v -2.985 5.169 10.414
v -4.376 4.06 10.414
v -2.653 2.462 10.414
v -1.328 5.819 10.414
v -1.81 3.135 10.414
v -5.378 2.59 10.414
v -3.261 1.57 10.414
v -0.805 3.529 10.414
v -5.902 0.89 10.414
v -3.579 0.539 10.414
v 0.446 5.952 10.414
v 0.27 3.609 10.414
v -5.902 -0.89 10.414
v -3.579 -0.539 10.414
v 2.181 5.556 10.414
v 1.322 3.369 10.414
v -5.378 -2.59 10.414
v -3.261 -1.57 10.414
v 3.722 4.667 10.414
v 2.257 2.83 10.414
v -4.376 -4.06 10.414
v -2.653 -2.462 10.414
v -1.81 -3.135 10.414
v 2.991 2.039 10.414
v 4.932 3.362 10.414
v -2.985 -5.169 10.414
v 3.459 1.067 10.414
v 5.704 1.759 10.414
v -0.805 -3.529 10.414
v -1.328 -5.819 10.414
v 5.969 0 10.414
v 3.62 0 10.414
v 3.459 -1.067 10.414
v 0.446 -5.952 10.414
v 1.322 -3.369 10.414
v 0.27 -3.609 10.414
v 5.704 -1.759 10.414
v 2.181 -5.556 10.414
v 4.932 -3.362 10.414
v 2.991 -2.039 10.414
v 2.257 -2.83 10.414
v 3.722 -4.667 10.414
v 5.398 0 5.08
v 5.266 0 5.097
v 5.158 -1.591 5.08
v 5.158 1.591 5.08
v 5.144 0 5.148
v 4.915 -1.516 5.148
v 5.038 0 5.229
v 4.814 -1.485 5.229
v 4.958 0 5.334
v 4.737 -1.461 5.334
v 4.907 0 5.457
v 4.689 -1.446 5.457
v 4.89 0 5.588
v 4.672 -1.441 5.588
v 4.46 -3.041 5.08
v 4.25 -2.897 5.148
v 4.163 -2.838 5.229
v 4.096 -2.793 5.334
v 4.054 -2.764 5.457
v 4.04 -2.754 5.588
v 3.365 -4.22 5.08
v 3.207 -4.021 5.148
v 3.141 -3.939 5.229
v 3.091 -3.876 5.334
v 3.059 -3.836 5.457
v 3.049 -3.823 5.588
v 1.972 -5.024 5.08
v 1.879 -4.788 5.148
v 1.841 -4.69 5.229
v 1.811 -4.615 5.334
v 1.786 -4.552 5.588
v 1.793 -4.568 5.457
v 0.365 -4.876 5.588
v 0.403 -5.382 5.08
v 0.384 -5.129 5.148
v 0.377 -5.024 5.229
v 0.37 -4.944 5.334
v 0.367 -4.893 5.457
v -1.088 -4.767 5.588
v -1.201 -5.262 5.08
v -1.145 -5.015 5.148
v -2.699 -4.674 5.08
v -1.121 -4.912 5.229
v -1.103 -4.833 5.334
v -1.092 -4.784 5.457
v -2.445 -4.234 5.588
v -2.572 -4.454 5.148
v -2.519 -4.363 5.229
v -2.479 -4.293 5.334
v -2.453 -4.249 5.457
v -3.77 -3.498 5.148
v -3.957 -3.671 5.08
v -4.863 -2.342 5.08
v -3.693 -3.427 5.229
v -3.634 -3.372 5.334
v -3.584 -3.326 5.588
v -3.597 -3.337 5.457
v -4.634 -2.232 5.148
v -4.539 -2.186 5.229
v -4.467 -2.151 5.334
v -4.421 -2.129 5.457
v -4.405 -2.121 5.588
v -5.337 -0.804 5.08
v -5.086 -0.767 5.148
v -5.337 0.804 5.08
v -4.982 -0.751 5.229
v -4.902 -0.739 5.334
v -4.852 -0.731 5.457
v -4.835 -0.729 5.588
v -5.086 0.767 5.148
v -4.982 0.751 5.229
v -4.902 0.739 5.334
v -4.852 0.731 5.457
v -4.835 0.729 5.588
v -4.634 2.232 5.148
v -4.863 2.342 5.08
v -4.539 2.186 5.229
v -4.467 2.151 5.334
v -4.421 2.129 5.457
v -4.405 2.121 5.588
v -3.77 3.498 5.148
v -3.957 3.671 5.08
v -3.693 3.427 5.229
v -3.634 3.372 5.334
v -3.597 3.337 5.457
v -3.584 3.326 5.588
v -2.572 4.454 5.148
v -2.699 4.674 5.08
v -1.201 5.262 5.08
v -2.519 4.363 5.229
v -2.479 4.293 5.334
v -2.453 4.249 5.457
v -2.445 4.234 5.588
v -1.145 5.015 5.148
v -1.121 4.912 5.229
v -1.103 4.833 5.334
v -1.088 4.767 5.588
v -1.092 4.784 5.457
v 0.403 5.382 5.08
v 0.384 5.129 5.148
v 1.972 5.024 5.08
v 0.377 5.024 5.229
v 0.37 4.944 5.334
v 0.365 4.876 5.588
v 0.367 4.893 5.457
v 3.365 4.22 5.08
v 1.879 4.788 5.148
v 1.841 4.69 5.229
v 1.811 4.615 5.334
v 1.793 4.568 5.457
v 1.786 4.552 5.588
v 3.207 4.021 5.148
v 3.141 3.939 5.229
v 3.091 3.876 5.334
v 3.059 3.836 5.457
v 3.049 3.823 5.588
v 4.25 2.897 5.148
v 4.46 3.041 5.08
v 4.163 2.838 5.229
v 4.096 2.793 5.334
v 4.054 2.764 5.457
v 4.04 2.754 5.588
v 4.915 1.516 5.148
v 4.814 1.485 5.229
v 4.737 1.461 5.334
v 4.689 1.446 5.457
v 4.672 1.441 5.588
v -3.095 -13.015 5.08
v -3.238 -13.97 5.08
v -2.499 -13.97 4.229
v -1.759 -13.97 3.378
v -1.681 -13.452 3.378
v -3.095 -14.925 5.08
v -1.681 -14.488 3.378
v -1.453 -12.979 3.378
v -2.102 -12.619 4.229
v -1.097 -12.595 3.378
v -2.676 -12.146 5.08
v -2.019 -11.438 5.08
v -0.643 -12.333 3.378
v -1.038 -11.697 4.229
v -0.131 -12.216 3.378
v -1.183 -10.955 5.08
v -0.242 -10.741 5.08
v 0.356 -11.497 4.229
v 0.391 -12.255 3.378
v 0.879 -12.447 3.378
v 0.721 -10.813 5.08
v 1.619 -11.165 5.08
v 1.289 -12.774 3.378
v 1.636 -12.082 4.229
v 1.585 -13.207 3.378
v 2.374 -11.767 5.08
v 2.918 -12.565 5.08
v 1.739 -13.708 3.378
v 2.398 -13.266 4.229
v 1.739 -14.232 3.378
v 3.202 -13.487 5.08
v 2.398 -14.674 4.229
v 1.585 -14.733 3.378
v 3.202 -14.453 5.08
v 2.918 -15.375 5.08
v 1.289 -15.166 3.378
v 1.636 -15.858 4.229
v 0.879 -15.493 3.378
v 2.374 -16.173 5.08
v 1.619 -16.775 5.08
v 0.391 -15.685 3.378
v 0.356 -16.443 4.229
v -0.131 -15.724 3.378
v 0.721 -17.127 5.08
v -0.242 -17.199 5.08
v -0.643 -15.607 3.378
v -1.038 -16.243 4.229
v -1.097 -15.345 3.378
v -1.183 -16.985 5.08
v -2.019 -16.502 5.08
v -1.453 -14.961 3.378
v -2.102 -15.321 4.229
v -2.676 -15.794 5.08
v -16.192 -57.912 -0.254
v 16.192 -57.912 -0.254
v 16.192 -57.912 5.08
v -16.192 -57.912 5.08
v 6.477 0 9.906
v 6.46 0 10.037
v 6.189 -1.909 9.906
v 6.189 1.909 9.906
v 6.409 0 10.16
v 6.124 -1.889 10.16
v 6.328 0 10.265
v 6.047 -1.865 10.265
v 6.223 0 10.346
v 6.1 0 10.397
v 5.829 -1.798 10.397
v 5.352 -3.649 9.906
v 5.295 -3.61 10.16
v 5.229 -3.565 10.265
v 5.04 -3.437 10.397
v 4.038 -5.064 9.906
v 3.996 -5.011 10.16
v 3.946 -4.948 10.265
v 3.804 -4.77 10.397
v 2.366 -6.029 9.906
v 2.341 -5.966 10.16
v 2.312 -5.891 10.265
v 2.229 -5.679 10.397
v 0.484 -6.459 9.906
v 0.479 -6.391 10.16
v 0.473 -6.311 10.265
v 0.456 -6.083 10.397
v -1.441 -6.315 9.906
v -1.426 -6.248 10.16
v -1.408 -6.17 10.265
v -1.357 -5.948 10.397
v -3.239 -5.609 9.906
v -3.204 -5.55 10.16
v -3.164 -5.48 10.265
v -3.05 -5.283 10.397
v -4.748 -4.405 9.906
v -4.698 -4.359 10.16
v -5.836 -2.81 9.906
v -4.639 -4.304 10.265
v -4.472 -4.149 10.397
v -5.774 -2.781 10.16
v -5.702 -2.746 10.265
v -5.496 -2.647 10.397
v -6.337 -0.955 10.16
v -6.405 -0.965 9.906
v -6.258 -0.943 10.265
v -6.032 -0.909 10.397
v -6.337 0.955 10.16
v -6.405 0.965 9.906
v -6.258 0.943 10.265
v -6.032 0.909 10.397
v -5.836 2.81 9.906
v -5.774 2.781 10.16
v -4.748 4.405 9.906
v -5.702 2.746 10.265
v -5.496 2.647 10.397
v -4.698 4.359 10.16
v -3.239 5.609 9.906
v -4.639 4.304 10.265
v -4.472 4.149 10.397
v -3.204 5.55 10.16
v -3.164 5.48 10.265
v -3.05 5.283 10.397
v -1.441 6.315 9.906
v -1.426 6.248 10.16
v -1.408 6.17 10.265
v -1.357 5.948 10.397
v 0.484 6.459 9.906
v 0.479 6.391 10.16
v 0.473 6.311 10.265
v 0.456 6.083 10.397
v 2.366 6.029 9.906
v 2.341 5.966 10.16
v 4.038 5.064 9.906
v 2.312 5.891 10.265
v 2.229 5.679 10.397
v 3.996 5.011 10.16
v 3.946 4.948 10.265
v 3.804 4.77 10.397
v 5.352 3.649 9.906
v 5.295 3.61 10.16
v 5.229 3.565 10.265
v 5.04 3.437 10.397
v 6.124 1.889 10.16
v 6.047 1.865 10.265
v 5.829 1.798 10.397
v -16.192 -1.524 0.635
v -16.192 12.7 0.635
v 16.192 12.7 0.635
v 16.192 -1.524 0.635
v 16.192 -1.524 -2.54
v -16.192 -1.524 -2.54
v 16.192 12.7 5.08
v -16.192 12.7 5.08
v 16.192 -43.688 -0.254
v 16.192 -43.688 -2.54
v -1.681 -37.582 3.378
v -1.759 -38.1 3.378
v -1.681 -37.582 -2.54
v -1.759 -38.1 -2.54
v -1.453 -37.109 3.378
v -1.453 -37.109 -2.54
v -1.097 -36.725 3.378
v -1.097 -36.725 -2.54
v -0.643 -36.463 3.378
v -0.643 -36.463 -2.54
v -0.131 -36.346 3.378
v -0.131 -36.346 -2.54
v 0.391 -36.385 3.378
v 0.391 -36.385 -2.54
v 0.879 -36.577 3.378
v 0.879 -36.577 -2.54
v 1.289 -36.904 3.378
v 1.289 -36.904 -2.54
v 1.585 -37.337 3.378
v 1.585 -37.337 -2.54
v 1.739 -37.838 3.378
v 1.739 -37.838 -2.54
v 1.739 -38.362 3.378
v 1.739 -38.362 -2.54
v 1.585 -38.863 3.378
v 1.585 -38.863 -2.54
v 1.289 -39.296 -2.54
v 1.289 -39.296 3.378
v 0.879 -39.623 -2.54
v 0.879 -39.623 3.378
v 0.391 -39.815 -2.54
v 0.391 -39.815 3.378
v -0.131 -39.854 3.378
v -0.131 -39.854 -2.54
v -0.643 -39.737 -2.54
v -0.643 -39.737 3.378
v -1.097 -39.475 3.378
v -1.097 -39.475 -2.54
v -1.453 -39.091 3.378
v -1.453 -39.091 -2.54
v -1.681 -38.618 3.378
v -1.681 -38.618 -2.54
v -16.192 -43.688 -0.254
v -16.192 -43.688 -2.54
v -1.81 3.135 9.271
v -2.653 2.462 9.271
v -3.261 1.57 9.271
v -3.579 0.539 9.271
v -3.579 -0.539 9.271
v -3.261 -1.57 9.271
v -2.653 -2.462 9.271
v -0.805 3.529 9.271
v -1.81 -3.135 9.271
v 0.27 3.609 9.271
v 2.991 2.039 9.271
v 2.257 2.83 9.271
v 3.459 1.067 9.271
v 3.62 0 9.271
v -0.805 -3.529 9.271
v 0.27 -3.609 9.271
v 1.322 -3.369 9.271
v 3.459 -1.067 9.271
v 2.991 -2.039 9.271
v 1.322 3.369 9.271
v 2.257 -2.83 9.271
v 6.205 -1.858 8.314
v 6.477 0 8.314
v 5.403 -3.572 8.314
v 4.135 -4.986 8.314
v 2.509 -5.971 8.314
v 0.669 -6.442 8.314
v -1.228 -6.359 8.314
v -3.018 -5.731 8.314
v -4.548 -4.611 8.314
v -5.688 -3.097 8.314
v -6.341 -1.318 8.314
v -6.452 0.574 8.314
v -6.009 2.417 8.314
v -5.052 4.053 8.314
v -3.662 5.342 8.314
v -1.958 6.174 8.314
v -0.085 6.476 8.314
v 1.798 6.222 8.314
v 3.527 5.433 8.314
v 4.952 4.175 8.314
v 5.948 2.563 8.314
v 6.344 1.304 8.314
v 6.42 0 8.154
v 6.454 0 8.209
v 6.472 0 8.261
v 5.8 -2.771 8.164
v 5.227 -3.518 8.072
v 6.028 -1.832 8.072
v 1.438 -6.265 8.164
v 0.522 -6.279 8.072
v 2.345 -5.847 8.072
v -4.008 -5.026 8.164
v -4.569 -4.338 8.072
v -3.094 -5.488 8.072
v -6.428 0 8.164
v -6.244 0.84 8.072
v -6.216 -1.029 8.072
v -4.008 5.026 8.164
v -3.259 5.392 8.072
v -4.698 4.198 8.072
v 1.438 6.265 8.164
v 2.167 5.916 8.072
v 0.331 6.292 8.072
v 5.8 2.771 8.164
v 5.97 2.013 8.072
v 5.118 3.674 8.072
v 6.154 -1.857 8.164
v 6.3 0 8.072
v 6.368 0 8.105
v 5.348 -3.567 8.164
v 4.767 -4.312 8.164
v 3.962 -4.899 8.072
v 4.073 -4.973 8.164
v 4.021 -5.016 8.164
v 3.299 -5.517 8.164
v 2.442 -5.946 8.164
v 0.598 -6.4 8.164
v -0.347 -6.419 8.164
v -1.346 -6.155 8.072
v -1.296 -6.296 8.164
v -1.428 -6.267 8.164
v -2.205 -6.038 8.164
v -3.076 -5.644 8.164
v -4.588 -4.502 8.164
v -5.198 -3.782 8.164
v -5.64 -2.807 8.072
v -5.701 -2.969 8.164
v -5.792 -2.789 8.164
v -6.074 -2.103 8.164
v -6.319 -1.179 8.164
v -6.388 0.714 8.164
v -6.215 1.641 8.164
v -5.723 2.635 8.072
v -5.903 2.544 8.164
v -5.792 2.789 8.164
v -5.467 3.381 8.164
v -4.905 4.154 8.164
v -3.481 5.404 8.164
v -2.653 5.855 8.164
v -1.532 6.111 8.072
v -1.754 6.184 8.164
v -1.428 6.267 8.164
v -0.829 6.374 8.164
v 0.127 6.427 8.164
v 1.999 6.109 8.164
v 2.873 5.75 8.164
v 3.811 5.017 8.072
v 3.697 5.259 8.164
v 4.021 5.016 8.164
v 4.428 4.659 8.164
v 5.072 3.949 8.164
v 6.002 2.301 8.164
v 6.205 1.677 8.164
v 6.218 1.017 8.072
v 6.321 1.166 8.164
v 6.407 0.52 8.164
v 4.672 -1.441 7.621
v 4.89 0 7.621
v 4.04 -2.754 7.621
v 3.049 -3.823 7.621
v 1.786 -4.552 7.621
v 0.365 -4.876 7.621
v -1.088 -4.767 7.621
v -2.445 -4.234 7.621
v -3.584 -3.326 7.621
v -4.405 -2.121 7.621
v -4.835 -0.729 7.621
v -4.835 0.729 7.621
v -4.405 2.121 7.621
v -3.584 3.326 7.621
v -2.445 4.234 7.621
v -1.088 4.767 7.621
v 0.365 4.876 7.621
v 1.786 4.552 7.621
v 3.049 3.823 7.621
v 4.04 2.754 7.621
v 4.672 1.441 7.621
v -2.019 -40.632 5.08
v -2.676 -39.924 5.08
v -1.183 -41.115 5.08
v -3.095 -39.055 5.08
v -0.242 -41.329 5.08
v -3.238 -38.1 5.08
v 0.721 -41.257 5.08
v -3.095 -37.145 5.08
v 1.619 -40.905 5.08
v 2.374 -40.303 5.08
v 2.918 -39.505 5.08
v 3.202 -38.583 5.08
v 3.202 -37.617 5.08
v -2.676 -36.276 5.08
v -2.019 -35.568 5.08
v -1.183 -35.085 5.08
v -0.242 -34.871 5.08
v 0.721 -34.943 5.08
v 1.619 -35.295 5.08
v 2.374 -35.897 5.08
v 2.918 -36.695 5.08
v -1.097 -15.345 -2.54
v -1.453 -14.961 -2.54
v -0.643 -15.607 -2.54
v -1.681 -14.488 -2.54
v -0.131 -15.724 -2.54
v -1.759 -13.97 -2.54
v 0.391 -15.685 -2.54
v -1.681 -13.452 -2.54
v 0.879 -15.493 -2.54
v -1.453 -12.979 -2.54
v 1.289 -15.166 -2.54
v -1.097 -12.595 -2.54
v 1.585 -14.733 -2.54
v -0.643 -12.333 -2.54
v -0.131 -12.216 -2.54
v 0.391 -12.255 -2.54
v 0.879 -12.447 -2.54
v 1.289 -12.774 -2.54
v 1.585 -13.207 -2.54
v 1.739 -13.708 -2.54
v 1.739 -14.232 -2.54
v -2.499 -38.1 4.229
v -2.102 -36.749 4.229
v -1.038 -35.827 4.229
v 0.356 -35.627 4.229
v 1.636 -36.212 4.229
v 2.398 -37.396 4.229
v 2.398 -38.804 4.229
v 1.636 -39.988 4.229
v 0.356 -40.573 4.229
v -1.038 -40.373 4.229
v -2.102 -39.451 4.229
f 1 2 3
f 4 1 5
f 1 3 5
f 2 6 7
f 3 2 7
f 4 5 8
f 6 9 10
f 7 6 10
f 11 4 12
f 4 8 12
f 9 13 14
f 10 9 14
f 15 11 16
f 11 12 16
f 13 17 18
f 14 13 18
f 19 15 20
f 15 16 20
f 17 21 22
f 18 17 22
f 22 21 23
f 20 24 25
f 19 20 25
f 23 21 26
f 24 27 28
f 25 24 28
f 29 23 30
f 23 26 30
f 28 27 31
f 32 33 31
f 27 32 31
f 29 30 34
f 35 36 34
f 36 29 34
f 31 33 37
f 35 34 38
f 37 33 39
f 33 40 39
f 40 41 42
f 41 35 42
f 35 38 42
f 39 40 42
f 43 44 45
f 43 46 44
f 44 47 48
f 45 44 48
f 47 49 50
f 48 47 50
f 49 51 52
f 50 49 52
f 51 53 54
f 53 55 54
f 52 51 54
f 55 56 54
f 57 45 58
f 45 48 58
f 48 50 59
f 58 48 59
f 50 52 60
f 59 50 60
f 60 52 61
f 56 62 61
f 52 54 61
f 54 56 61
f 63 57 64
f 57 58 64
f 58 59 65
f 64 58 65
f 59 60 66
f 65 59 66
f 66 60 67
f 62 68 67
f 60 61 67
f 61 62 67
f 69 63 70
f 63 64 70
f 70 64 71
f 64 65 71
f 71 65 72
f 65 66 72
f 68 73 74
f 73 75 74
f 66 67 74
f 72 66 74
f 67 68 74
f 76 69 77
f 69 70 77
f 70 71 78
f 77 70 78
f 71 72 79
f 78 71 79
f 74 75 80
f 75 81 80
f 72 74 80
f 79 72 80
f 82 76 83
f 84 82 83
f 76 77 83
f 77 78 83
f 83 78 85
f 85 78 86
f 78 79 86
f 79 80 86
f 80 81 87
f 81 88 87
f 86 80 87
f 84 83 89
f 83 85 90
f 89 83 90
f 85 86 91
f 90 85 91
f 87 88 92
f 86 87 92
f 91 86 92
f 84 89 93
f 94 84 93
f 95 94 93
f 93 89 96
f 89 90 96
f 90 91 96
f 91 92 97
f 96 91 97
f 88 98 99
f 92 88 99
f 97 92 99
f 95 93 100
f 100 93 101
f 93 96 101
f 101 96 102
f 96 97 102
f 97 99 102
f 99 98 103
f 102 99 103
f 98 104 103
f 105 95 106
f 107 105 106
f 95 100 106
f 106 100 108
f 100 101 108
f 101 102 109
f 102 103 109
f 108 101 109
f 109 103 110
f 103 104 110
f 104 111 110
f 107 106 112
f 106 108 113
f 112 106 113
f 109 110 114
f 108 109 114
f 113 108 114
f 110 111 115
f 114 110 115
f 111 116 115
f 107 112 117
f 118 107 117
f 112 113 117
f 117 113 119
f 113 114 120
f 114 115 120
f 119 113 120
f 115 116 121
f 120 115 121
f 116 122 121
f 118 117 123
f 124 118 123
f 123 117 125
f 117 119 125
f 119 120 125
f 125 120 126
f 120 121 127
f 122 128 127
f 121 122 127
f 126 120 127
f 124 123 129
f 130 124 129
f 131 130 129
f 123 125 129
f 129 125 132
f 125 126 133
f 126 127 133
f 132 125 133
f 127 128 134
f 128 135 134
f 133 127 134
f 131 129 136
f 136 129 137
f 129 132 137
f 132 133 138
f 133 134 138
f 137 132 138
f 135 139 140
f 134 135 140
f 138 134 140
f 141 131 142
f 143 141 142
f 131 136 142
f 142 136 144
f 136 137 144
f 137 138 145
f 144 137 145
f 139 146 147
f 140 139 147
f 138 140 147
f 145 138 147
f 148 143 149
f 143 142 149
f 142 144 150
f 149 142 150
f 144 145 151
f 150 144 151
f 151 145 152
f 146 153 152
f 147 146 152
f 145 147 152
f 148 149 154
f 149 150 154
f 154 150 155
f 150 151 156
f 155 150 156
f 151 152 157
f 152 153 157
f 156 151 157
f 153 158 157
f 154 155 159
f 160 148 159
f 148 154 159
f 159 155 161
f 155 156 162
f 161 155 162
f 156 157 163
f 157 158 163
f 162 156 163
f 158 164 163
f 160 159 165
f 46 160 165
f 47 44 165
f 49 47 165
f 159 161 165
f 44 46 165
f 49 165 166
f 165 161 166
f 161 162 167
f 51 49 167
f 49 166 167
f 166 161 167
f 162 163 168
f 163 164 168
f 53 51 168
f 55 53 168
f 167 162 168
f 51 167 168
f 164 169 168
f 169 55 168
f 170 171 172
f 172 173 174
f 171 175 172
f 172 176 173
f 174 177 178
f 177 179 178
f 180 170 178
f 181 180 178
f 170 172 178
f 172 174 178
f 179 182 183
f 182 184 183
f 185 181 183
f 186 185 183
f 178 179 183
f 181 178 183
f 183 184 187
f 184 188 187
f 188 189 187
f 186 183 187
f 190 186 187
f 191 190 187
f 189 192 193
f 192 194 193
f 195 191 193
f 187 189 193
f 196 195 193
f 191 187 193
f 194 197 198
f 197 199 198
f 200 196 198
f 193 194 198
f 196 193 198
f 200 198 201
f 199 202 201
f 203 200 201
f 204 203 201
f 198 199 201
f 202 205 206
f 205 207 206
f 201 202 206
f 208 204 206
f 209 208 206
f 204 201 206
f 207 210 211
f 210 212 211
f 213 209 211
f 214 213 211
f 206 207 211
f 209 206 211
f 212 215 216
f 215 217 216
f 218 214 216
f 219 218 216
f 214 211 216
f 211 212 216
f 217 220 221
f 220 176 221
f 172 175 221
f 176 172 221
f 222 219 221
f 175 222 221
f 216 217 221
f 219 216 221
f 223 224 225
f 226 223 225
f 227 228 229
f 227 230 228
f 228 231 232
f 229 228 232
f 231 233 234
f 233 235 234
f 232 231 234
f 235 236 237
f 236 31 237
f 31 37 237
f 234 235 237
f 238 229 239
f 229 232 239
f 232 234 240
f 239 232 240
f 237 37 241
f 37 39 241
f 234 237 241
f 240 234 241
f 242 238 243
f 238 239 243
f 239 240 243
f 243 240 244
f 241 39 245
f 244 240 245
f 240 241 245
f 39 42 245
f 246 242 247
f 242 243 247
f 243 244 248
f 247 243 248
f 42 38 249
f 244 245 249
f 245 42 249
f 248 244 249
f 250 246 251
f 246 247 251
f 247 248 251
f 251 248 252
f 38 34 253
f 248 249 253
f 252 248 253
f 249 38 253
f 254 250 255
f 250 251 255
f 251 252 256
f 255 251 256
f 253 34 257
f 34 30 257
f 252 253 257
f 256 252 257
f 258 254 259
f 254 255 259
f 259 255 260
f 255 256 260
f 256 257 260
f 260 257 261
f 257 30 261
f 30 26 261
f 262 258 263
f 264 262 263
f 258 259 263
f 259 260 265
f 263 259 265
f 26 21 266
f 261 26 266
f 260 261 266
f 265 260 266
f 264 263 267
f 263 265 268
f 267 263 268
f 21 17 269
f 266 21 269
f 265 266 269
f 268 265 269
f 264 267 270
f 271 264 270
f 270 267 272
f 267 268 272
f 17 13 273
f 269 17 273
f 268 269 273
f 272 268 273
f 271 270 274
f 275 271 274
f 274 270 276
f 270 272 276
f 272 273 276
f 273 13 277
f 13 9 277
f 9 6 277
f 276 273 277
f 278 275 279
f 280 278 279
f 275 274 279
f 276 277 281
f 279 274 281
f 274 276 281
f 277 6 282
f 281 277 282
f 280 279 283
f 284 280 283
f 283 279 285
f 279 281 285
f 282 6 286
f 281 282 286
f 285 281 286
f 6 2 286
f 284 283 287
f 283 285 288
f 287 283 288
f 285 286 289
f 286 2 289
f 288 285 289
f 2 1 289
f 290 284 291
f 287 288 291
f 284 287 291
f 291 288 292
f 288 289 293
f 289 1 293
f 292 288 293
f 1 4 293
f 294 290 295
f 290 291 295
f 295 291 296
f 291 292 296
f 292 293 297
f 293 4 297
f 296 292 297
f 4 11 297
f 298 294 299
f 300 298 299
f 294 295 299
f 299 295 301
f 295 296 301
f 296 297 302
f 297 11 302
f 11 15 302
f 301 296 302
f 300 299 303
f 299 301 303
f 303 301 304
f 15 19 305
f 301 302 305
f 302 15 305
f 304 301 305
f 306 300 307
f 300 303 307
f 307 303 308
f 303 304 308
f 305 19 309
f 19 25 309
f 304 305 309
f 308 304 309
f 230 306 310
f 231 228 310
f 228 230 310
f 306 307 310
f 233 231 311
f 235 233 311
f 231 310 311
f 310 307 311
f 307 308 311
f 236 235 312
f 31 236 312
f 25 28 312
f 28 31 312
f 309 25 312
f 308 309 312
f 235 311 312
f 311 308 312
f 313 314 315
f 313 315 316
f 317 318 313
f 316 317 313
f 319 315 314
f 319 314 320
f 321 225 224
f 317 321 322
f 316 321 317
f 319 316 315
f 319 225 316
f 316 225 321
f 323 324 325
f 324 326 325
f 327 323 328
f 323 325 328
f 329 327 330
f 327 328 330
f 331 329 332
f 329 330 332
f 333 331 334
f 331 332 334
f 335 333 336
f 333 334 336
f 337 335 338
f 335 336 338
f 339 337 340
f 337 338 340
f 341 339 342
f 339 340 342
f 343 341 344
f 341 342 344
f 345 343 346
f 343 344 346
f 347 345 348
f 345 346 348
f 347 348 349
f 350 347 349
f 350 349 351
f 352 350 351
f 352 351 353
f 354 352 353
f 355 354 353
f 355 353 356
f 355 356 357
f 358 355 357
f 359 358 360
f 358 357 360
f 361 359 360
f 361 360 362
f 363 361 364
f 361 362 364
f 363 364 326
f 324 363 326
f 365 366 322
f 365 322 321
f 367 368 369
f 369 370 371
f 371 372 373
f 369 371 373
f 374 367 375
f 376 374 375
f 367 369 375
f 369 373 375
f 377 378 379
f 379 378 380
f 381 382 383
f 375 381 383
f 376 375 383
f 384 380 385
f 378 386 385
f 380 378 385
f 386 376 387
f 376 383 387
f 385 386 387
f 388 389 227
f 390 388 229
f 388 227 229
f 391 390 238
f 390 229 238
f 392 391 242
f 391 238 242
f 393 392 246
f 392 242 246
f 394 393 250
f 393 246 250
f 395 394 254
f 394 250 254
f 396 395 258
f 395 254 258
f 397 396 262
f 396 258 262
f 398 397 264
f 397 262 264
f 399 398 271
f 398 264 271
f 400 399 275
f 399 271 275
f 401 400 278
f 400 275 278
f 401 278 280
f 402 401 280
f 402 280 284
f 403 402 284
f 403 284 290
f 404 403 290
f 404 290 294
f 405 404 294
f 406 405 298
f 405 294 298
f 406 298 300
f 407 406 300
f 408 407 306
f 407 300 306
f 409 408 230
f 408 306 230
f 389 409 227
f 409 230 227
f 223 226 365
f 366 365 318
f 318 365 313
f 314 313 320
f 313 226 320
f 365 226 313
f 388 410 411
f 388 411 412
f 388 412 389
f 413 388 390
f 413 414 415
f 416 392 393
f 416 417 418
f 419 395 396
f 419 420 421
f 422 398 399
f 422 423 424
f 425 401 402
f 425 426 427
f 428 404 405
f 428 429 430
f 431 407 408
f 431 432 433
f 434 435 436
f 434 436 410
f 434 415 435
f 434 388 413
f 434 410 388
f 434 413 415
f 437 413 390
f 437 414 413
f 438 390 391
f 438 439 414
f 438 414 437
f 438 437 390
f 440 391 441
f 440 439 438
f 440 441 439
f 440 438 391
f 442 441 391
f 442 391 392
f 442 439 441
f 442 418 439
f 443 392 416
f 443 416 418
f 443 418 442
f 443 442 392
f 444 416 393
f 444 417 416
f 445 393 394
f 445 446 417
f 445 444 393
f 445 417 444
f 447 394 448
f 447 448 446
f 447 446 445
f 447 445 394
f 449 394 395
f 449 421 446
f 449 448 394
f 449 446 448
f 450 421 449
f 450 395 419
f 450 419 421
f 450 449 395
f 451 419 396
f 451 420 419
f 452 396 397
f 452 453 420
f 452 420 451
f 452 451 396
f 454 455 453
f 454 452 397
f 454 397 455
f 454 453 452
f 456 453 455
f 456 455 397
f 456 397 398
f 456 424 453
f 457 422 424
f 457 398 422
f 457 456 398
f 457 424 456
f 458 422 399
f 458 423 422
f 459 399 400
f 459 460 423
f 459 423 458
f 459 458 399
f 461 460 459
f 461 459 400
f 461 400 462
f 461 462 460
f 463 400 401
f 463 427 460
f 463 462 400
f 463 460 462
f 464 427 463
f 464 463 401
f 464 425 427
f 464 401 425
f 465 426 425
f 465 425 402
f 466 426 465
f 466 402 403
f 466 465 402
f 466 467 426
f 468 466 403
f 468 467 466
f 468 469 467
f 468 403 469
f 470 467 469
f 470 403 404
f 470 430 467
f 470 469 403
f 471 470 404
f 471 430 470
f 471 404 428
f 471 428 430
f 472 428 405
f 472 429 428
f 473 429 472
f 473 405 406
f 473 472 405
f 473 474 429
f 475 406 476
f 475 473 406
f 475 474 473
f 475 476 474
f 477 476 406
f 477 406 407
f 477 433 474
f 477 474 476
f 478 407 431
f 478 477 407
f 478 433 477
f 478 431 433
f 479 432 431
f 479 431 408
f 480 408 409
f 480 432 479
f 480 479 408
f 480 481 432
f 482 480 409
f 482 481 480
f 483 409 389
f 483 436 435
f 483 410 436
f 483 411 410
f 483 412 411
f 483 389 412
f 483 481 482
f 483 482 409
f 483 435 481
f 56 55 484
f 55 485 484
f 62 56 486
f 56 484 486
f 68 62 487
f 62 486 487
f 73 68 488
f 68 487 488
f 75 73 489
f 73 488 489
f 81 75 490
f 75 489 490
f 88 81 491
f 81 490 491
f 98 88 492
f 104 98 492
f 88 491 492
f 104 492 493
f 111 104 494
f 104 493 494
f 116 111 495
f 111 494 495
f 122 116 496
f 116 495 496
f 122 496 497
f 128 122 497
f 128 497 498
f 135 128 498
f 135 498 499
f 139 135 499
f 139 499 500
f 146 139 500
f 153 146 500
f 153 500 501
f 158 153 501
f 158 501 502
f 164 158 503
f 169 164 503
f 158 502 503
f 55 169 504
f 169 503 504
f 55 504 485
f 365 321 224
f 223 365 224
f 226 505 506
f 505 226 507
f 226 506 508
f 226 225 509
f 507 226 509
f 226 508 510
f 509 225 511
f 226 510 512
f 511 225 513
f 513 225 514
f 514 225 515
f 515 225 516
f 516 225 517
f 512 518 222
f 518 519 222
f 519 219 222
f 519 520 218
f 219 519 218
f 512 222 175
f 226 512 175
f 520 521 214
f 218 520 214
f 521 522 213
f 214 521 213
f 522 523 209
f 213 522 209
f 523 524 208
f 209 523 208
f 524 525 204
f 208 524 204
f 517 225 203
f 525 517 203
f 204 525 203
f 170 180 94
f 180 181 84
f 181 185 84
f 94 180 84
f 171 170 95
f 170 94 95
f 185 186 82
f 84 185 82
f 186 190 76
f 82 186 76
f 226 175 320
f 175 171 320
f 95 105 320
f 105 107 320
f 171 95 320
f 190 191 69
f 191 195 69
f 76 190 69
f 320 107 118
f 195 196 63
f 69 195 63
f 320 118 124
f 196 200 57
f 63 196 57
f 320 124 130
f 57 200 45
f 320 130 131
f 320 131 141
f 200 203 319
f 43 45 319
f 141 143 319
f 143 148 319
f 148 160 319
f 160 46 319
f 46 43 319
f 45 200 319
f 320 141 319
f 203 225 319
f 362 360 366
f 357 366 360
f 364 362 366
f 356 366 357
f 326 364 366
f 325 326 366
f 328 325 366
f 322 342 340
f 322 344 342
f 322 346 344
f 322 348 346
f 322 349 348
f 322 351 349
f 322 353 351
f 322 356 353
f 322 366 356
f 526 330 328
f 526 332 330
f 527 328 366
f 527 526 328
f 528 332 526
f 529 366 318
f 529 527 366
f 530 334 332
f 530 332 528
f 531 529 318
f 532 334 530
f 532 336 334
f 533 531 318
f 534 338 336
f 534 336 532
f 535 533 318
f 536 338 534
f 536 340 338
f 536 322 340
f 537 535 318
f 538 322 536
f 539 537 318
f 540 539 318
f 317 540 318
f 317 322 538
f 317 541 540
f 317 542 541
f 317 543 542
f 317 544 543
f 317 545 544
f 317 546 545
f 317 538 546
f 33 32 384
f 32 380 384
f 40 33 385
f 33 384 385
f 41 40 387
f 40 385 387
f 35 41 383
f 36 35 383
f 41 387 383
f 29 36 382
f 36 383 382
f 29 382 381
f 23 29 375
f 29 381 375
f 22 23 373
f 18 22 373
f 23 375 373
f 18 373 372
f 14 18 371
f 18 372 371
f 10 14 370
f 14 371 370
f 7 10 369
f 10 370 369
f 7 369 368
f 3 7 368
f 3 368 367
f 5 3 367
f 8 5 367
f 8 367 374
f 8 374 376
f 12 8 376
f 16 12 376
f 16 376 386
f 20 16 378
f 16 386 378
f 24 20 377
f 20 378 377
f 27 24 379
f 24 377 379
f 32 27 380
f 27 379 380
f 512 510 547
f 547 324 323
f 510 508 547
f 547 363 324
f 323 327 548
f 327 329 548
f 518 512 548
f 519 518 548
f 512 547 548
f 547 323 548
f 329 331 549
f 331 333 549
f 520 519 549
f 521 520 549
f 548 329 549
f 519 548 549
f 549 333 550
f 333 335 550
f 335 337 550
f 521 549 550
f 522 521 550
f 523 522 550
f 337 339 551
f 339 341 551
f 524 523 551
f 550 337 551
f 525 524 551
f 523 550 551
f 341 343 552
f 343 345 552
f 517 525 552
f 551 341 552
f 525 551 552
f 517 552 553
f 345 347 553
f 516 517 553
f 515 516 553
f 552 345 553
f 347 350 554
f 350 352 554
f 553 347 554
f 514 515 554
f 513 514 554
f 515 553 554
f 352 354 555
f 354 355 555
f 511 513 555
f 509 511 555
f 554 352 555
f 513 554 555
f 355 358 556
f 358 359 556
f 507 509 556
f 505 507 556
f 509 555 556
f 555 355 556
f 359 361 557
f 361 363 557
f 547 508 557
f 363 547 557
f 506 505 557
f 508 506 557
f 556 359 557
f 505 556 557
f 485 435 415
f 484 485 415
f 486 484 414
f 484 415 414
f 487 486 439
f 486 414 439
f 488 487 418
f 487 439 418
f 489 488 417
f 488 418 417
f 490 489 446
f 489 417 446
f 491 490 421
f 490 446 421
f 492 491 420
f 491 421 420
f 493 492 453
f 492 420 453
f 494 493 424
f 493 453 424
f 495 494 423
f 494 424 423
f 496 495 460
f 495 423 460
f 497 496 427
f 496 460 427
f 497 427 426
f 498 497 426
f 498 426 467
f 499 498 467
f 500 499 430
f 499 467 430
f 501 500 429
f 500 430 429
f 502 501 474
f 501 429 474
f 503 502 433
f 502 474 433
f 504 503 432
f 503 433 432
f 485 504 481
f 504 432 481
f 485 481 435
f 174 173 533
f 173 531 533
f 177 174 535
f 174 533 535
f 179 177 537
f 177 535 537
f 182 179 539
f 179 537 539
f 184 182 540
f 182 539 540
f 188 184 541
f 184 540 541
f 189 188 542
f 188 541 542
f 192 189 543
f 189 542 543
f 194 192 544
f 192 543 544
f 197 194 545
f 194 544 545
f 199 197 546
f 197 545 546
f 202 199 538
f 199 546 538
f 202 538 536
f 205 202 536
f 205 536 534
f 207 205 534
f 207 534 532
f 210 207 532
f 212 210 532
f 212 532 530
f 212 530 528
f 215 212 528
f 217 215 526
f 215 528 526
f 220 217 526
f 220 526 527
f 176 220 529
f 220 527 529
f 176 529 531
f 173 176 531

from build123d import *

# Parameters (mm, degrees)
F2_R            = 0.508
F3_S5_R         = 4.8895
F3_T6_DEPTH     = 11
F4_R            = 0.254
F5_W            = 70.612
F5_H            = 7.62
F6_DEPTH        = 16.1925
F7_W            = 14.224
F7_H            = 3.175
F7_H_2          = 2.286
F8_DEPTH        = 32.386
F10_D           = 3.5179
F10_CSINK_D     = 6.477
F10_CSINK_ANGLE = 82


# Not quite as in the source:
# - a fillet or chamfer that OpenCascade refuses, or shapes differently, is made with other operations: its cross-section is extruded or revolved along the edge and cut away or added


with BuildPart() as f1:
    # F0 (on Front) → F1 (revolve)
    with BuildSketch(Plane.XZ):
        Polygon((0, 9.271), (0, 0), (11.1125, 0), (11.1125, 5.08), (4.8895, 5.08), (4.8895, 7.62), (6.477, 7.62), (6.477, 10.414), (3.6195, 10.414), (3.6195, 9.271), align=None)
    revolve(axis=Axis((0, 0, 5.207), (0, 0, -1)))

    # F2
    f2_edges = [f1.edges().sort_by_distance(p)[0] for p in [
        (-6.477, 0, 10.414),
        (-4.8895, 0, 5.08),
    ]]
    fillet(f2_edges, radius=F2_R)

    # F3: chamfer of 0.508 x 1.5917743649 on 1 edges, made by hand


with BuildPart() as f3_tool2:
    # F3_s3 → F3_t4 (revolve)
    with BuildSketch(Plane.XZ):
        Polygon((4.8852256351, 7.62), (6.477, 8.128), (6.477, 7.62), align=None)
    revolve(axis=Axis((0, 0, 7.62), (0, 0, -1)))

    # F3_s5 → F3_t6 (cut, symmetric)
    with BuildSketch(Plane.XY.offset(7.9)):
        Circle(F3_S5_R)
    extrude(amount=F3_T6_DEPTH, both=True, mode=Mode.SUBTRACT)


with BuildPart() as f1_1:
    add(f1.part)

    # F3_t1: cut F3_tool2
    add(f3_tool2.part, mode=Mode.SUBTRACT)

    # F4
    f4_edges = [f1_1.edges().sort_by_distance(p)[0] for p in [
        (-6.477, 0, 8.128),
    ]]
    fillet(f4_edges, radius=F4_R)

    # F5 (on Right) → F6 (join, symmetric)
    with BuildSketch(Plane.YZ):
        with Locations((-22.606, 1.27)):
            Rectangle(F5_W, F5_H)
    extrude(amount=F6_DEPTH, both=True)

    # F7 (on face) → F8 (cut, through all)
    with BuildSketch(Plane(origin=(-16.1925, 0, 0), x_dir=(0, -1, 0), z_dir=(-1, 0, 0))):
        with Locations((-5.588, -0.9525)):
            Rectangle(F7_W, F7_H)
        with Locations((50.8, -1.397)):
            Rectangle(F7_W, F7_H_2)
    extrude(amount=-F8_DEPTH, mode=Mode.SUBTRACT)

    # F10 (through all)
    with Locations(Plane.XY.offset(5.08)):
        with Locations((0, -13.97), (0, -38.1)):
            CounterSinkHole(F10_D / 2, F10_CSINK_D / 2, counter_sink_angle=F10_CSINK_ANGLE)


solid = f1_1.part
